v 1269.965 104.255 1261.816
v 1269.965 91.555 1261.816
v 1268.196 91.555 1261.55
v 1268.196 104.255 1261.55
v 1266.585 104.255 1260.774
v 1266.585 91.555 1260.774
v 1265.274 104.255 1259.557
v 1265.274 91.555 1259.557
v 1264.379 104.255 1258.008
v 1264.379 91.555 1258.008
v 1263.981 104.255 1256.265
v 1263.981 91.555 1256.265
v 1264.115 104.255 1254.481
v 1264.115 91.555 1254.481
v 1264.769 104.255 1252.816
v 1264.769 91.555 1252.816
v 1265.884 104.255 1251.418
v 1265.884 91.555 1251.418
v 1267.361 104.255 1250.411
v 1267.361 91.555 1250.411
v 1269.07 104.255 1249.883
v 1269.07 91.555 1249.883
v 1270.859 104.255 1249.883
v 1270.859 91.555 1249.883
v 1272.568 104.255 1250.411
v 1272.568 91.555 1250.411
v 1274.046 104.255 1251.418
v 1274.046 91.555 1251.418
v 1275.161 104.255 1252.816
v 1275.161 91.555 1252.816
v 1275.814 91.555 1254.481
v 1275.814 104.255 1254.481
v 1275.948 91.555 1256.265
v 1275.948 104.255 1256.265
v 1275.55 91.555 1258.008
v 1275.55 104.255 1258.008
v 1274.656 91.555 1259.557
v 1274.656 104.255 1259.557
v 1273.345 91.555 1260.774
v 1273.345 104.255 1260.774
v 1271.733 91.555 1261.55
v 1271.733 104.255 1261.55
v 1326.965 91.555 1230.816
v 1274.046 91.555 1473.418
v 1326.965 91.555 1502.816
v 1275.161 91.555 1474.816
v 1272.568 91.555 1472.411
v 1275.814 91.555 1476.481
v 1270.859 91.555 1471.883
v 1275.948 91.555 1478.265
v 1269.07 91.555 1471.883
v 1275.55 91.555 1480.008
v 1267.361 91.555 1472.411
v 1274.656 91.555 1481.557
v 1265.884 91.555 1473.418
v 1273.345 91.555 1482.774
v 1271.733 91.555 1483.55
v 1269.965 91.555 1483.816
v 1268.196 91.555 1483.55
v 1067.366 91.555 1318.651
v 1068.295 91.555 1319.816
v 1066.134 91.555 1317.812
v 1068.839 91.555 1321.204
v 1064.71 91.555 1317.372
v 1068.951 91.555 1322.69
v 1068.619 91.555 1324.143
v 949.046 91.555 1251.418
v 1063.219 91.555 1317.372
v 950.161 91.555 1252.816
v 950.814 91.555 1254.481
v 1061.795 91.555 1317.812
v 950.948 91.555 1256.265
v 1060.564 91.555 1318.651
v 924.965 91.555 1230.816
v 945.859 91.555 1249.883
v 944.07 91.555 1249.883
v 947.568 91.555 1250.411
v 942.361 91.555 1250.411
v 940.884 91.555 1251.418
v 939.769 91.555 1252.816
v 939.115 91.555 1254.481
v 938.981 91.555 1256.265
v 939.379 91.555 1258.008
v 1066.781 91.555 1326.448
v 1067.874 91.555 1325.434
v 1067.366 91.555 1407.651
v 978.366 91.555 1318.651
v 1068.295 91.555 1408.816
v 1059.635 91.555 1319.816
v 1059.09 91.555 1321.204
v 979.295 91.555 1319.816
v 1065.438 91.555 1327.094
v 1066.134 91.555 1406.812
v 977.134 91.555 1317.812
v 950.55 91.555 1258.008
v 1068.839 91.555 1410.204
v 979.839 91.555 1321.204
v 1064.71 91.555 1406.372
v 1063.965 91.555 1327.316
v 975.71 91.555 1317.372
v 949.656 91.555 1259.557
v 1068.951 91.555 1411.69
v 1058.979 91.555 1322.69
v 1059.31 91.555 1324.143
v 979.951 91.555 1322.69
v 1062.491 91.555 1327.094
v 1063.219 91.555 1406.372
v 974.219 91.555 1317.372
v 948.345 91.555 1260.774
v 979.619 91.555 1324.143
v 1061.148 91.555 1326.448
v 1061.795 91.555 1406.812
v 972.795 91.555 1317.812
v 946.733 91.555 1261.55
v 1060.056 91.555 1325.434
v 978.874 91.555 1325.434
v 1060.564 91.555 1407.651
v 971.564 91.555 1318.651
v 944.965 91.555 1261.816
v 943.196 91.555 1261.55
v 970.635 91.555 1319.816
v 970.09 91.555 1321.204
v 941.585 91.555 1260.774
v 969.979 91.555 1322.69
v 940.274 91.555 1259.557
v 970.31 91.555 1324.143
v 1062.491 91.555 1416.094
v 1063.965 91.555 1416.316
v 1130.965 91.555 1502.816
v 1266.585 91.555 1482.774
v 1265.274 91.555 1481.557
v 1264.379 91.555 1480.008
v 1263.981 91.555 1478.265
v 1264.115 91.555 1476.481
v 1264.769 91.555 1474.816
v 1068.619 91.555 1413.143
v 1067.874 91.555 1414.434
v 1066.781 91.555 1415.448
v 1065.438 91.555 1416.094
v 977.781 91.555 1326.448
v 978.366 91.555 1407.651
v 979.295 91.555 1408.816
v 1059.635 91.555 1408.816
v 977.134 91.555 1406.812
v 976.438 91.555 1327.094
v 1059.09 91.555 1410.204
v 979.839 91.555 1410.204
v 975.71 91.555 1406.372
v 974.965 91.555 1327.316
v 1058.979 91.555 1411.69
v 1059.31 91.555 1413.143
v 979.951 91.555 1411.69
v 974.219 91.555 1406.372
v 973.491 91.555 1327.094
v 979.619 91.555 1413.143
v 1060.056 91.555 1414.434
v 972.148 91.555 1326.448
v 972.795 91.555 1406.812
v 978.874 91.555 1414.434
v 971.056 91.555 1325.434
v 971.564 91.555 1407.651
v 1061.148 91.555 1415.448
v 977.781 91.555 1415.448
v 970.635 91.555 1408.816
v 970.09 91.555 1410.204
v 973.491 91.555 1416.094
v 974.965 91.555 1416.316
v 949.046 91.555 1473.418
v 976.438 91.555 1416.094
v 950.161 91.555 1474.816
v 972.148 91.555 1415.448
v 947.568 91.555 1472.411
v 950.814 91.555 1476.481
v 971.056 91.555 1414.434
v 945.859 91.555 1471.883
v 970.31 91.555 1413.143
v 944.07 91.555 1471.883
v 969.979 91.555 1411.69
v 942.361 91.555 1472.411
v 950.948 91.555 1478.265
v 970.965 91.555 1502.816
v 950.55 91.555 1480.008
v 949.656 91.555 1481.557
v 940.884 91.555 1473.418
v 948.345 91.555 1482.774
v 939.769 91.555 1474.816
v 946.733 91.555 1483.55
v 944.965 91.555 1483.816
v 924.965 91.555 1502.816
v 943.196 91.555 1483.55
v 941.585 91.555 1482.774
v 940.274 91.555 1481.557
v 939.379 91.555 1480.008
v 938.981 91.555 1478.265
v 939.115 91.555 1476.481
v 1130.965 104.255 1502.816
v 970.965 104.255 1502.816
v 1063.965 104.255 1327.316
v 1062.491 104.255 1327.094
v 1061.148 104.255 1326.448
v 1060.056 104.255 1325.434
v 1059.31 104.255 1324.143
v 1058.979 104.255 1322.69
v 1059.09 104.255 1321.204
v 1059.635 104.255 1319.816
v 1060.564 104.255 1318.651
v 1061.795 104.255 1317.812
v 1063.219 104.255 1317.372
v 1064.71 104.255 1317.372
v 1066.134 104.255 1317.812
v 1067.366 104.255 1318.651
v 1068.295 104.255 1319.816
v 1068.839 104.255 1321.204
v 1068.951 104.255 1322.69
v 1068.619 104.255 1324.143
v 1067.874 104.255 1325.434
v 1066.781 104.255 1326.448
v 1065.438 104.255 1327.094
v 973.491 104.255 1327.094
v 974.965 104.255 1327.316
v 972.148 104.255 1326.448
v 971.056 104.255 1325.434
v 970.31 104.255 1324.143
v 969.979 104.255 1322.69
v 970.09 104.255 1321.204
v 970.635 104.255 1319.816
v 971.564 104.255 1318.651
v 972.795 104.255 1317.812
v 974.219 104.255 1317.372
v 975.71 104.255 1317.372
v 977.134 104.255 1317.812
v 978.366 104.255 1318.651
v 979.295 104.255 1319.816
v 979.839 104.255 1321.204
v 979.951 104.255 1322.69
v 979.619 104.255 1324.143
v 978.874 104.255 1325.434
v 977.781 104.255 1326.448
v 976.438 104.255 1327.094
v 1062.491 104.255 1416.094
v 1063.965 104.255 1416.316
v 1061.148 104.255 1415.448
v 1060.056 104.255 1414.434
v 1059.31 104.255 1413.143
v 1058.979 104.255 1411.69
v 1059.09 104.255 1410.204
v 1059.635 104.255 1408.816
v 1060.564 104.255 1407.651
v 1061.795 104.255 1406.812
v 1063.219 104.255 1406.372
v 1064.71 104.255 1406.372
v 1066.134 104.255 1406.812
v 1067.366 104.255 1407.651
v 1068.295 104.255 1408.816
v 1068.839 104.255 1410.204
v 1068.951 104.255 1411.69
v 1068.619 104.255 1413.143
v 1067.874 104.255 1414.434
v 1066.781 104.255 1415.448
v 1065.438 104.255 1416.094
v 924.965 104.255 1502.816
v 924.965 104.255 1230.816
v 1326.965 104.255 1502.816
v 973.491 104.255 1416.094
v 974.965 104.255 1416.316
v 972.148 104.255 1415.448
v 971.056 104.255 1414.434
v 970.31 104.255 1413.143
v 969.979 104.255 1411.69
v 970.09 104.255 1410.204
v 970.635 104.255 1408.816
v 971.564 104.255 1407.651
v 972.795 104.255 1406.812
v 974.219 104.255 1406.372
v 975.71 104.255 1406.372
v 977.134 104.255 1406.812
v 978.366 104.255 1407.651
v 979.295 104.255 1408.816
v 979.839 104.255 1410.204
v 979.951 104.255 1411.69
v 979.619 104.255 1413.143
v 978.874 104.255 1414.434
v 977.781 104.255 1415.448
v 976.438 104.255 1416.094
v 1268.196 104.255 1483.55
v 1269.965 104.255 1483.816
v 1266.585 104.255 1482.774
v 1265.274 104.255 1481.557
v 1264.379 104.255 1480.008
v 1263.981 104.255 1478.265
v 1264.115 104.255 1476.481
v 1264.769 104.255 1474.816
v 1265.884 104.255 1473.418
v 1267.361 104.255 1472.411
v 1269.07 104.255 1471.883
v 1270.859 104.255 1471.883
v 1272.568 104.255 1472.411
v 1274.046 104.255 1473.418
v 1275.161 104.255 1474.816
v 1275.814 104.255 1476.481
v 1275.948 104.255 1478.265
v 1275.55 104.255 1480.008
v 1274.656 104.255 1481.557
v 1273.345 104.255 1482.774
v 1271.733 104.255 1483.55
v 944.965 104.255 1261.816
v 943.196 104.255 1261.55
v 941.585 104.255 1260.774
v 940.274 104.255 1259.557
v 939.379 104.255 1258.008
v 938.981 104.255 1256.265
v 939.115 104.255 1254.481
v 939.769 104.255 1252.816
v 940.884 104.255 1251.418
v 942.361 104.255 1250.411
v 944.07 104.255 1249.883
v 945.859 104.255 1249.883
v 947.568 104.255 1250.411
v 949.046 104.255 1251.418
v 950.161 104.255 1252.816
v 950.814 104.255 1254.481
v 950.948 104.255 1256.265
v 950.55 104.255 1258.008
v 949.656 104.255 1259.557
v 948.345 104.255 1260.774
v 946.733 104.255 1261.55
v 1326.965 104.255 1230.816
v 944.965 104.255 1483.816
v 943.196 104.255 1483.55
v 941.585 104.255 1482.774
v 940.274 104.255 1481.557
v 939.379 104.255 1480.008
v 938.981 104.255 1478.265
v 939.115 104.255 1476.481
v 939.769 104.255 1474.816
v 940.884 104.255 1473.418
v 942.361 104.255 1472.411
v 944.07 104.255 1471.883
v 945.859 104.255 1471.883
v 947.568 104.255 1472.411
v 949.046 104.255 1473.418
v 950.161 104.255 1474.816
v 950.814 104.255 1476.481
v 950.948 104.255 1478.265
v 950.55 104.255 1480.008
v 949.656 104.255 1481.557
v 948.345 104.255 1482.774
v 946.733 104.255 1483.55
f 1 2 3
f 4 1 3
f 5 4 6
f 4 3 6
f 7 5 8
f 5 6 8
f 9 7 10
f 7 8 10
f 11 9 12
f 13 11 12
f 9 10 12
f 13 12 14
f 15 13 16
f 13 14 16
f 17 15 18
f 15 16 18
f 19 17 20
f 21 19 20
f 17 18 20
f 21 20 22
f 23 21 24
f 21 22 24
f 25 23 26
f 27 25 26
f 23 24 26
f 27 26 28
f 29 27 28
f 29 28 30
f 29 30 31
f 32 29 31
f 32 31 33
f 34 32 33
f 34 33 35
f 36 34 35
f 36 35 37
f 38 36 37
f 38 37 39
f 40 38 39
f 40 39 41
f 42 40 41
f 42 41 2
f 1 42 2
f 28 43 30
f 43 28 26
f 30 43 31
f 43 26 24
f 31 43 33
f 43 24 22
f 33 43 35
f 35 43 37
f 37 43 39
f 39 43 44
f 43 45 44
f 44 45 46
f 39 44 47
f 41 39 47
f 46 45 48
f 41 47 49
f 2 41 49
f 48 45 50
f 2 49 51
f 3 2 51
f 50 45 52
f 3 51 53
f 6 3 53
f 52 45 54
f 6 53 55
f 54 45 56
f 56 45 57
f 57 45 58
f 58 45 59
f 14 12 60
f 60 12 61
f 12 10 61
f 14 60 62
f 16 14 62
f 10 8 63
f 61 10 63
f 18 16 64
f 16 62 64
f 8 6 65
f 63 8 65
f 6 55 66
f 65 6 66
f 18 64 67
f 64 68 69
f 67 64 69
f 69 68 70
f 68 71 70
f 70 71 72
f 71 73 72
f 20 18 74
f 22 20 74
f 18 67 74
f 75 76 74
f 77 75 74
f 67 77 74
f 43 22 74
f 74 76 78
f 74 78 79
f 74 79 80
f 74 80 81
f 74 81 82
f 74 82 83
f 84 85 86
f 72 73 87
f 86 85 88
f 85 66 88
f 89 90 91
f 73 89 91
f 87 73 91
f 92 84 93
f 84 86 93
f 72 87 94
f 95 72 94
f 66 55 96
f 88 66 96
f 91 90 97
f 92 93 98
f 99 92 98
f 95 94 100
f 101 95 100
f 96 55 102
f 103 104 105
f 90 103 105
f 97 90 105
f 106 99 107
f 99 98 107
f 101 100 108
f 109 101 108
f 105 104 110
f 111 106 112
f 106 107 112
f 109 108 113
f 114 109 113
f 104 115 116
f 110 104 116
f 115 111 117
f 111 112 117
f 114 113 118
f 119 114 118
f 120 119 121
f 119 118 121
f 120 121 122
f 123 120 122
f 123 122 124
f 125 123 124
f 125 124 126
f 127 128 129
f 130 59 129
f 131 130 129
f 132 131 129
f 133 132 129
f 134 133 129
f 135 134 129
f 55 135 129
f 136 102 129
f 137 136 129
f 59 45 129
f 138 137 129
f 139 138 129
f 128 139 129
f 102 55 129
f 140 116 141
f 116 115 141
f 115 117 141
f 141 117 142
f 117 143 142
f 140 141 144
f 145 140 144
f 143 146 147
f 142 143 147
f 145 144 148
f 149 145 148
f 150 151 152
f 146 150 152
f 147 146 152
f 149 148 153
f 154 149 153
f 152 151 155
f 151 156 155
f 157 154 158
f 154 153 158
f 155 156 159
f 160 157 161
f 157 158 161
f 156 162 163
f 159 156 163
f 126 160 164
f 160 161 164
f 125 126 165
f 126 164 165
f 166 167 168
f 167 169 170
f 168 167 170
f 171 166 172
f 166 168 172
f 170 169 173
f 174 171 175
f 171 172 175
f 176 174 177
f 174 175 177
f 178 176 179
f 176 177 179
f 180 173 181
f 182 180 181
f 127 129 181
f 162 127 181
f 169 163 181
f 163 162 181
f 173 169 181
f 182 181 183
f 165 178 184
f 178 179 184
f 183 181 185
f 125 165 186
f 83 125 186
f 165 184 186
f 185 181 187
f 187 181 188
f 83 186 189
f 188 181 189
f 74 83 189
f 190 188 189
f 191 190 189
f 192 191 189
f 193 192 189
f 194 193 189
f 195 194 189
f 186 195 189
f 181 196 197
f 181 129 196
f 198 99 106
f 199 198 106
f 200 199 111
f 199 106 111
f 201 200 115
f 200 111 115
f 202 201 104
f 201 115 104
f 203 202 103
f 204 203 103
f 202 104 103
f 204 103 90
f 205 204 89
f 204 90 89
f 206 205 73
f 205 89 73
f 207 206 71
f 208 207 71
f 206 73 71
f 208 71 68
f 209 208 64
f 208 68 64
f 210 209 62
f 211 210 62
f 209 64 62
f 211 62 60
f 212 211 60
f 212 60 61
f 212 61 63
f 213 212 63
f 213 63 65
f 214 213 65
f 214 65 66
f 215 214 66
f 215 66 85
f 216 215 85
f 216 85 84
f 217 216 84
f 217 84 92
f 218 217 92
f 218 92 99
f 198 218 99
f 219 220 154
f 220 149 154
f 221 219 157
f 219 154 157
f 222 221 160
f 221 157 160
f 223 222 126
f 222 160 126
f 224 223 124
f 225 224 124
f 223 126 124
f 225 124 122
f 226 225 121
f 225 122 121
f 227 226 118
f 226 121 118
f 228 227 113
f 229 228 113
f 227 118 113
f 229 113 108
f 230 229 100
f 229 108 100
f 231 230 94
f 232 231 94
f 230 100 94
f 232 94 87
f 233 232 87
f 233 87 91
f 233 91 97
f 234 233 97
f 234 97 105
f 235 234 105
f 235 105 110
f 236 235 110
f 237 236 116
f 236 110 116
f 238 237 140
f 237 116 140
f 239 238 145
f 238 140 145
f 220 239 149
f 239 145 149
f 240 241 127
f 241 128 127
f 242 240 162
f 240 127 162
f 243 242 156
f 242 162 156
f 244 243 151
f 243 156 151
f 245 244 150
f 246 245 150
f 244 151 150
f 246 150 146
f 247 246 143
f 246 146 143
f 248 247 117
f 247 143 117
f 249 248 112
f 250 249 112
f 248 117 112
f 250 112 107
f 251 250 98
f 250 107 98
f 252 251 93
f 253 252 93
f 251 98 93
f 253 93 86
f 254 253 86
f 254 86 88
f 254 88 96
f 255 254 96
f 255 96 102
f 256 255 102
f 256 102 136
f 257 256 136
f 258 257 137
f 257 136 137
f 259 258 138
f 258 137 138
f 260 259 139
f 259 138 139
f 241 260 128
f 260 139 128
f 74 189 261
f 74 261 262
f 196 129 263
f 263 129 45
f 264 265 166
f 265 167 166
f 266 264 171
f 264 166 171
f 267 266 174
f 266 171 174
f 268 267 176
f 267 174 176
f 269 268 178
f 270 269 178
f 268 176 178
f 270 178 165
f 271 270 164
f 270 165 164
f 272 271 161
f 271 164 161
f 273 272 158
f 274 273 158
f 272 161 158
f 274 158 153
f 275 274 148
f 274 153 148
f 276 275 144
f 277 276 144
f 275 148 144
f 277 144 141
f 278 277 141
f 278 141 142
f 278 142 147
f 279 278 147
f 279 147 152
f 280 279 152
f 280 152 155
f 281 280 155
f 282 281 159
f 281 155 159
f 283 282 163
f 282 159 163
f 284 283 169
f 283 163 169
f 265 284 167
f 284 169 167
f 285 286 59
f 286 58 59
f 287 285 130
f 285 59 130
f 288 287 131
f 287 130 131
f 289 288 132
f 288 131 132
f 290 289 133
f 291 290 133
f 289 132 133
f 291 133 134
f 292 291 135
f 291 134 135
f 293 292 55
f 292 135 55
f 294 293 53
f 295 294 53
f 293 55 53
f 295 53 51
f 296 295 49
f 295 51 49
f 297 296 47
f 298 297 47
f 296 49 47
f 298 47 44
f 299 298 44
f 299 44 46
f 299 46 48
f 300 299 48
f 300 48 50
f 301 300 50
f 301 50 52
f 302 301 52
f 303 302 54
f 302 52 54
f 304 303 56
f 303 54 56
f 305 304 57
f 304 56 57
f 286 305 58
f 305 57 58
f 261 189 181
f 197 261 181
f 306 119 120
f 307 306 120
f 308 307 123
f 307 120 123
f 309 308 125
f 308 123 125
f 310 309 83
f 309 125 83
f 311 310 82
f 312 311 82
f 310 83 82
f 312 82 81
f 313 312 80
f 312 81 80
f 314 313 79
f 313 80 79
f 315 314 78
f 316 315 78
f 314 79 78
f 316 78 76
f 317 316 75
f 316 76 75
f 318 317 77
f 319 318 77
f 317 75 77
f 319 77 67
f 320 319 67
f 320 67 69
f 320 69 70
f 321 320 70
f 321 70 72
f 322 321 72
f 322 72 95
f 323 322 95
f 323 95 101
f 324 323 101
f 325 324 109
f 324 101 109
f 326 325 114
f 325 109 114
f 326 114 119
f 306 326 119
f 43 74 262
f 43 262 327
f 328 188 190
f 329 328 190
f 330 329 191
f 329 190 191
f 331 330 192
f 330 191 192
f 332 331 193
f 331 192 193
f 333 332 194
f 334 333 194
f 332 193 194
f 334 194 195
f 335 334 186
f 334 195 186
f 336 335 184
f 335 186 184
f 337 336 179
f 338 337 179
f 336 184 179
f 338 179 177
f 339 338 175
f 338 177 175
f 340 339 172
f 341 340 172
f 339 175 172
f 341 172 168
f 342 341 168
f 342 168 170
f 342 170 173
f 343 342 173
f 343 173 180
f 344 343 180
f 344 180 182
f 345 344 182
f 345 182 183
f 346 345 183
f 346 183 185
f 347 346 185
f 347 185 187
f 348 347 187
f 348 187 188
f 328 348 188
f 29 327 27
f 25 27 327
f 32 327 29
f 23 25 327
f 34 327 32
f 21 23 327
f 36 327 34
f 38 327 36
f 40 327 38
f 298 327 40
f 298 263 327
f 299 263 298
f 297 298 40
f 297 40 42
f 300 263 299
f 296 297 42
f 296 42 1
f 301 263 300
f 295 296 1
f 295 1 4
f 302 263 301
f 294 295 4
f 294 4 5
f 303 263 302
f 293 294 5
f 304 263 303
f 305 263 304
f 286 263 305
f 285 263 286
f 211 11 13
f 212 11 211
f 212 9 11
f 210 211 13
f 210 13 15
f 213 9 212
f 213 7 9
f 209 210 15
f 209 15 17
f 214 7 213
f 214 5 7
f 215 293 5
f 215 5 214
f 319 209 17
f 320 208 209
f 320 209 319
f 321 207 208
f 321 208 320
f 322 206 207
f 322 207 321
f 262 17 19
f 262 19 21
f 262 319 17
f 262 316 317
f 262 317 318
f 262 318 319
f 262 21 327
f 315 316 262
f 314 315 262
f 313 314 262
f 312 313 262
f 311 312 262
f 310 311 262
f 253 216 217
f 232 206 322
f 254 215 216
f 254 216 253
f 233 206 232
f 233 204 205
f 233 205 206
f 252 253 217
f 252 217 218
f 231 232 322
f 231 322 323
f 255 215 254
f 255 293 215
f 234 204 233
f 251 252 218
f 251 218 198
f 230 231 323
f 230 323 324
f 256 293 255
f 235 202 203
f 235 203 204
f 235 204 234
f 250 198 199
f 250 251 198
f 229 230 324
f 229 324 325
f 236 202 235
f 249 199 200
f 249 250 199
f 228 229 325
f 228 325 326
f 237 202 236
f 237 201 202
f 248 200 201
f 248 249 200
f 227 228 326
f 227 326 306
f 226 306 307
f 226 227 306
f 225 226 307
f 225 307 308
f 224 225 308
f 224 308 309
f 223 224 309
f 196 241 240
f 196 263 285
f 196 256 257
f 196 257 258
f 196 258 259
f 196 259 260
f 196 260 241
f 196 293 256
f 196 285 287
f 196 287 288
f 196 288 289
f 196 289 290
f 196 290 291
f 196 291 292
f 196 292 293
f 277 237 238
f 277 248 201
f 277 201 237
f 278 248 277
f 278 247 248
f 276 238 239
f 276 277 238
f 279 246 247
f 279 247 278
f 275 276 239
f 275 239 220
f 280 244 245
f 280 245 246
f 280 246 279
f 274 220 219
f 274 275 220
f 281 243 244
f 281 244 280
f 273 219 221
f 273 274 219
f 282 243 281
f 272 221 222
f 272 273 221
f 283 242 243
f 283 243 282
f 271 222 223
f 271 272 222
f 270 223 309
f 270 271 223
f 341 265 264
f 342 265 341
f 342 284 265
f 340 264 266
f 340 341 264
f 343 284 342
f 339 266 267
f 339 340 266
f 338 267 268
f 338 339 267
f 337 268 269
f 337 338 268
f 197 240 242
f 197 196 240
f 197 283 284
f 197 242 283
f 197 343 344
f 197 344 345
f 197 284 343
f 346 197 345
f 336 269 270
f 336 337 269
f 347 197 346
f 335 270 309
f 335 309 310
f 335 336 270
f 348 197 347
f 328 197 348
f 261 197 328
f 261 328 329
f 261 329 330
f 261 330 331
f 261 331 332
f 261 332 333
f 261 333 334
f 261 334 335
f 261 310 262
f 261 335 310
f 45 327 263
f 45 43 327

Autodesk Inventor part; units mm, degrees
ref_plane "YZ Plane" through (0, 0, 0) normal (1, 0, 0) x (0, 1, 0)
ref_plane "XZ Plane" through (0, 0, 0) normal (0, 1, 0) x (-1, 0, 0)
ref_plane "Work Plane1" through (1104.5696, 91.5553, 211.8164) normal (0, 1, 0) x (-1, 0, 0)
sketch "Sketch1" plane through (1104.5696, 91.5553, 211.8164) normal (0, 1, 0) x (-1, 0, 0)
  arc A0 (57.6551, 1254.9955) -> (57.6551, 1150.0245) centre (104.395, 1202.51) ccw
  line L0 (-26.3951, 1291) -> (133.6049, 1291)
  line L1 (133.6049, 1019) -> (-26.3951, 1019)
  line L2 (-26.3951, 1249) -> (-26.3951, 1291)
  line L3 (179.6049, 2285) -> (179.6049, 25)
  line L4 (179.6049, 1019) -> (179.6049, 1291.0001)
  line L5 (-72.3951, 25) -> (-72.3951, 2285)
  line L6 (179.6049, 1291.0001) -> (-222.3951, 1291.0001)
  line L7 (179.6049, 1019) -> (-222.3951, 1019)
  line L8 (-222.3951, 25) -> (-222.3951, 2285)
  line L9 (-222.3951, 1291.0001) -> (-222.3951, 1019)
  point P0 (1104.5696, -211.8164)
  point P1 (-72.3951, 1291.0001)
  point P2 (-72.3951, 1019)
  point P3 (154, 1291)
  point P4 (4, 1291)
extrude "Extrusion1" add sketch "Sketch1" along normal blind 12.7
sketch "Sketch2" plane through (1104.5696, 104.2553, 211.8164) normal (0, 1, 0) x (1, 0, 0)
  line L0 (222.3951, -1019) -> (-179.6049, -1019) construction
  line L1 (-179.6049, -1019) -> (-179.6049, -1291.0001) construction
  line L2 (-179.6049, -1291.0001) -> (222.3951, -1291.0001) construction
  line L3 (222.3951, -1291.0001) -> (222.3951, -1019) construction
  line L4 (-179.6049, -1291.0001) -> (222.3951, -1291.0001) construction
  line L5 (21.3951, -1291.0001) -> (21.3951, -1019) construction
  line L6 (-179.6049, -1019) -> (-179.6049, -1291.0001) construction
  line L7 (-179.6049, -1155) -> (222.3951, -1155) construction
  point P0 (-1104.5696, 211.8164)
  point P1 (-159.6049, -1266.0001)
  point P2 (165.3951, -1266.0001)
  point P3 (-159.6049, -1044)
  point P4 (165.3951, -1044)
  dimension "d16" = 25
  dimension "d17" = 20
  dimension "d18" = 25
  dimension "d19" = 325
hole "Hole1" at (944.9647, 104.2553, 1477.8164) at (944.9647, 104.2553, 1255.8164) at (1269.9647, 104.2553, 1255.8164) at (1269.9647, 104.2553, 1477.8164) direction (0, -1, 0) diameter 12 end through all
sketch "Sketch3" plane through (1104.5696, 104.2553, 211.8164) normal (0, 1, 0) x (1, 0, 0)
  line L0 (-129.6049, -1110.5) -> (-40.6049, -1110.5)
  line L1 (-40.6049, -1110.5) -> (-40.6049, -1199.5)
  line L2 (-40.6049, -1199.5) -> (-129.6049, -1199.5)
  line L3 (-129.6049, -1199.5) -> (-129.6049, -1110.5)
  line L4 (-179.6049, -1019) -> (-179.6049, -1291.0001) projected
  line L5 (-179.6049, -1155) -> (-143.519, -1155)
  point P0 (-1104.5696, 211.8164)
  dimension "d20" = 89
  dimension "d21" = 89
  dimension "d22" = 50
hole "Hole2" at (974.9647, 104.2553, 1322.3164) at (1063.9647, 104.2553, 1322.3164) at (1063.9647, 104.2553, 1411.3164) at (974.9647, 104.2553, 1411.3164) direction (0, -1, 0) diameter 10 end through all
properties part number "PlacaInferior" material "Steel ASTM A36"
